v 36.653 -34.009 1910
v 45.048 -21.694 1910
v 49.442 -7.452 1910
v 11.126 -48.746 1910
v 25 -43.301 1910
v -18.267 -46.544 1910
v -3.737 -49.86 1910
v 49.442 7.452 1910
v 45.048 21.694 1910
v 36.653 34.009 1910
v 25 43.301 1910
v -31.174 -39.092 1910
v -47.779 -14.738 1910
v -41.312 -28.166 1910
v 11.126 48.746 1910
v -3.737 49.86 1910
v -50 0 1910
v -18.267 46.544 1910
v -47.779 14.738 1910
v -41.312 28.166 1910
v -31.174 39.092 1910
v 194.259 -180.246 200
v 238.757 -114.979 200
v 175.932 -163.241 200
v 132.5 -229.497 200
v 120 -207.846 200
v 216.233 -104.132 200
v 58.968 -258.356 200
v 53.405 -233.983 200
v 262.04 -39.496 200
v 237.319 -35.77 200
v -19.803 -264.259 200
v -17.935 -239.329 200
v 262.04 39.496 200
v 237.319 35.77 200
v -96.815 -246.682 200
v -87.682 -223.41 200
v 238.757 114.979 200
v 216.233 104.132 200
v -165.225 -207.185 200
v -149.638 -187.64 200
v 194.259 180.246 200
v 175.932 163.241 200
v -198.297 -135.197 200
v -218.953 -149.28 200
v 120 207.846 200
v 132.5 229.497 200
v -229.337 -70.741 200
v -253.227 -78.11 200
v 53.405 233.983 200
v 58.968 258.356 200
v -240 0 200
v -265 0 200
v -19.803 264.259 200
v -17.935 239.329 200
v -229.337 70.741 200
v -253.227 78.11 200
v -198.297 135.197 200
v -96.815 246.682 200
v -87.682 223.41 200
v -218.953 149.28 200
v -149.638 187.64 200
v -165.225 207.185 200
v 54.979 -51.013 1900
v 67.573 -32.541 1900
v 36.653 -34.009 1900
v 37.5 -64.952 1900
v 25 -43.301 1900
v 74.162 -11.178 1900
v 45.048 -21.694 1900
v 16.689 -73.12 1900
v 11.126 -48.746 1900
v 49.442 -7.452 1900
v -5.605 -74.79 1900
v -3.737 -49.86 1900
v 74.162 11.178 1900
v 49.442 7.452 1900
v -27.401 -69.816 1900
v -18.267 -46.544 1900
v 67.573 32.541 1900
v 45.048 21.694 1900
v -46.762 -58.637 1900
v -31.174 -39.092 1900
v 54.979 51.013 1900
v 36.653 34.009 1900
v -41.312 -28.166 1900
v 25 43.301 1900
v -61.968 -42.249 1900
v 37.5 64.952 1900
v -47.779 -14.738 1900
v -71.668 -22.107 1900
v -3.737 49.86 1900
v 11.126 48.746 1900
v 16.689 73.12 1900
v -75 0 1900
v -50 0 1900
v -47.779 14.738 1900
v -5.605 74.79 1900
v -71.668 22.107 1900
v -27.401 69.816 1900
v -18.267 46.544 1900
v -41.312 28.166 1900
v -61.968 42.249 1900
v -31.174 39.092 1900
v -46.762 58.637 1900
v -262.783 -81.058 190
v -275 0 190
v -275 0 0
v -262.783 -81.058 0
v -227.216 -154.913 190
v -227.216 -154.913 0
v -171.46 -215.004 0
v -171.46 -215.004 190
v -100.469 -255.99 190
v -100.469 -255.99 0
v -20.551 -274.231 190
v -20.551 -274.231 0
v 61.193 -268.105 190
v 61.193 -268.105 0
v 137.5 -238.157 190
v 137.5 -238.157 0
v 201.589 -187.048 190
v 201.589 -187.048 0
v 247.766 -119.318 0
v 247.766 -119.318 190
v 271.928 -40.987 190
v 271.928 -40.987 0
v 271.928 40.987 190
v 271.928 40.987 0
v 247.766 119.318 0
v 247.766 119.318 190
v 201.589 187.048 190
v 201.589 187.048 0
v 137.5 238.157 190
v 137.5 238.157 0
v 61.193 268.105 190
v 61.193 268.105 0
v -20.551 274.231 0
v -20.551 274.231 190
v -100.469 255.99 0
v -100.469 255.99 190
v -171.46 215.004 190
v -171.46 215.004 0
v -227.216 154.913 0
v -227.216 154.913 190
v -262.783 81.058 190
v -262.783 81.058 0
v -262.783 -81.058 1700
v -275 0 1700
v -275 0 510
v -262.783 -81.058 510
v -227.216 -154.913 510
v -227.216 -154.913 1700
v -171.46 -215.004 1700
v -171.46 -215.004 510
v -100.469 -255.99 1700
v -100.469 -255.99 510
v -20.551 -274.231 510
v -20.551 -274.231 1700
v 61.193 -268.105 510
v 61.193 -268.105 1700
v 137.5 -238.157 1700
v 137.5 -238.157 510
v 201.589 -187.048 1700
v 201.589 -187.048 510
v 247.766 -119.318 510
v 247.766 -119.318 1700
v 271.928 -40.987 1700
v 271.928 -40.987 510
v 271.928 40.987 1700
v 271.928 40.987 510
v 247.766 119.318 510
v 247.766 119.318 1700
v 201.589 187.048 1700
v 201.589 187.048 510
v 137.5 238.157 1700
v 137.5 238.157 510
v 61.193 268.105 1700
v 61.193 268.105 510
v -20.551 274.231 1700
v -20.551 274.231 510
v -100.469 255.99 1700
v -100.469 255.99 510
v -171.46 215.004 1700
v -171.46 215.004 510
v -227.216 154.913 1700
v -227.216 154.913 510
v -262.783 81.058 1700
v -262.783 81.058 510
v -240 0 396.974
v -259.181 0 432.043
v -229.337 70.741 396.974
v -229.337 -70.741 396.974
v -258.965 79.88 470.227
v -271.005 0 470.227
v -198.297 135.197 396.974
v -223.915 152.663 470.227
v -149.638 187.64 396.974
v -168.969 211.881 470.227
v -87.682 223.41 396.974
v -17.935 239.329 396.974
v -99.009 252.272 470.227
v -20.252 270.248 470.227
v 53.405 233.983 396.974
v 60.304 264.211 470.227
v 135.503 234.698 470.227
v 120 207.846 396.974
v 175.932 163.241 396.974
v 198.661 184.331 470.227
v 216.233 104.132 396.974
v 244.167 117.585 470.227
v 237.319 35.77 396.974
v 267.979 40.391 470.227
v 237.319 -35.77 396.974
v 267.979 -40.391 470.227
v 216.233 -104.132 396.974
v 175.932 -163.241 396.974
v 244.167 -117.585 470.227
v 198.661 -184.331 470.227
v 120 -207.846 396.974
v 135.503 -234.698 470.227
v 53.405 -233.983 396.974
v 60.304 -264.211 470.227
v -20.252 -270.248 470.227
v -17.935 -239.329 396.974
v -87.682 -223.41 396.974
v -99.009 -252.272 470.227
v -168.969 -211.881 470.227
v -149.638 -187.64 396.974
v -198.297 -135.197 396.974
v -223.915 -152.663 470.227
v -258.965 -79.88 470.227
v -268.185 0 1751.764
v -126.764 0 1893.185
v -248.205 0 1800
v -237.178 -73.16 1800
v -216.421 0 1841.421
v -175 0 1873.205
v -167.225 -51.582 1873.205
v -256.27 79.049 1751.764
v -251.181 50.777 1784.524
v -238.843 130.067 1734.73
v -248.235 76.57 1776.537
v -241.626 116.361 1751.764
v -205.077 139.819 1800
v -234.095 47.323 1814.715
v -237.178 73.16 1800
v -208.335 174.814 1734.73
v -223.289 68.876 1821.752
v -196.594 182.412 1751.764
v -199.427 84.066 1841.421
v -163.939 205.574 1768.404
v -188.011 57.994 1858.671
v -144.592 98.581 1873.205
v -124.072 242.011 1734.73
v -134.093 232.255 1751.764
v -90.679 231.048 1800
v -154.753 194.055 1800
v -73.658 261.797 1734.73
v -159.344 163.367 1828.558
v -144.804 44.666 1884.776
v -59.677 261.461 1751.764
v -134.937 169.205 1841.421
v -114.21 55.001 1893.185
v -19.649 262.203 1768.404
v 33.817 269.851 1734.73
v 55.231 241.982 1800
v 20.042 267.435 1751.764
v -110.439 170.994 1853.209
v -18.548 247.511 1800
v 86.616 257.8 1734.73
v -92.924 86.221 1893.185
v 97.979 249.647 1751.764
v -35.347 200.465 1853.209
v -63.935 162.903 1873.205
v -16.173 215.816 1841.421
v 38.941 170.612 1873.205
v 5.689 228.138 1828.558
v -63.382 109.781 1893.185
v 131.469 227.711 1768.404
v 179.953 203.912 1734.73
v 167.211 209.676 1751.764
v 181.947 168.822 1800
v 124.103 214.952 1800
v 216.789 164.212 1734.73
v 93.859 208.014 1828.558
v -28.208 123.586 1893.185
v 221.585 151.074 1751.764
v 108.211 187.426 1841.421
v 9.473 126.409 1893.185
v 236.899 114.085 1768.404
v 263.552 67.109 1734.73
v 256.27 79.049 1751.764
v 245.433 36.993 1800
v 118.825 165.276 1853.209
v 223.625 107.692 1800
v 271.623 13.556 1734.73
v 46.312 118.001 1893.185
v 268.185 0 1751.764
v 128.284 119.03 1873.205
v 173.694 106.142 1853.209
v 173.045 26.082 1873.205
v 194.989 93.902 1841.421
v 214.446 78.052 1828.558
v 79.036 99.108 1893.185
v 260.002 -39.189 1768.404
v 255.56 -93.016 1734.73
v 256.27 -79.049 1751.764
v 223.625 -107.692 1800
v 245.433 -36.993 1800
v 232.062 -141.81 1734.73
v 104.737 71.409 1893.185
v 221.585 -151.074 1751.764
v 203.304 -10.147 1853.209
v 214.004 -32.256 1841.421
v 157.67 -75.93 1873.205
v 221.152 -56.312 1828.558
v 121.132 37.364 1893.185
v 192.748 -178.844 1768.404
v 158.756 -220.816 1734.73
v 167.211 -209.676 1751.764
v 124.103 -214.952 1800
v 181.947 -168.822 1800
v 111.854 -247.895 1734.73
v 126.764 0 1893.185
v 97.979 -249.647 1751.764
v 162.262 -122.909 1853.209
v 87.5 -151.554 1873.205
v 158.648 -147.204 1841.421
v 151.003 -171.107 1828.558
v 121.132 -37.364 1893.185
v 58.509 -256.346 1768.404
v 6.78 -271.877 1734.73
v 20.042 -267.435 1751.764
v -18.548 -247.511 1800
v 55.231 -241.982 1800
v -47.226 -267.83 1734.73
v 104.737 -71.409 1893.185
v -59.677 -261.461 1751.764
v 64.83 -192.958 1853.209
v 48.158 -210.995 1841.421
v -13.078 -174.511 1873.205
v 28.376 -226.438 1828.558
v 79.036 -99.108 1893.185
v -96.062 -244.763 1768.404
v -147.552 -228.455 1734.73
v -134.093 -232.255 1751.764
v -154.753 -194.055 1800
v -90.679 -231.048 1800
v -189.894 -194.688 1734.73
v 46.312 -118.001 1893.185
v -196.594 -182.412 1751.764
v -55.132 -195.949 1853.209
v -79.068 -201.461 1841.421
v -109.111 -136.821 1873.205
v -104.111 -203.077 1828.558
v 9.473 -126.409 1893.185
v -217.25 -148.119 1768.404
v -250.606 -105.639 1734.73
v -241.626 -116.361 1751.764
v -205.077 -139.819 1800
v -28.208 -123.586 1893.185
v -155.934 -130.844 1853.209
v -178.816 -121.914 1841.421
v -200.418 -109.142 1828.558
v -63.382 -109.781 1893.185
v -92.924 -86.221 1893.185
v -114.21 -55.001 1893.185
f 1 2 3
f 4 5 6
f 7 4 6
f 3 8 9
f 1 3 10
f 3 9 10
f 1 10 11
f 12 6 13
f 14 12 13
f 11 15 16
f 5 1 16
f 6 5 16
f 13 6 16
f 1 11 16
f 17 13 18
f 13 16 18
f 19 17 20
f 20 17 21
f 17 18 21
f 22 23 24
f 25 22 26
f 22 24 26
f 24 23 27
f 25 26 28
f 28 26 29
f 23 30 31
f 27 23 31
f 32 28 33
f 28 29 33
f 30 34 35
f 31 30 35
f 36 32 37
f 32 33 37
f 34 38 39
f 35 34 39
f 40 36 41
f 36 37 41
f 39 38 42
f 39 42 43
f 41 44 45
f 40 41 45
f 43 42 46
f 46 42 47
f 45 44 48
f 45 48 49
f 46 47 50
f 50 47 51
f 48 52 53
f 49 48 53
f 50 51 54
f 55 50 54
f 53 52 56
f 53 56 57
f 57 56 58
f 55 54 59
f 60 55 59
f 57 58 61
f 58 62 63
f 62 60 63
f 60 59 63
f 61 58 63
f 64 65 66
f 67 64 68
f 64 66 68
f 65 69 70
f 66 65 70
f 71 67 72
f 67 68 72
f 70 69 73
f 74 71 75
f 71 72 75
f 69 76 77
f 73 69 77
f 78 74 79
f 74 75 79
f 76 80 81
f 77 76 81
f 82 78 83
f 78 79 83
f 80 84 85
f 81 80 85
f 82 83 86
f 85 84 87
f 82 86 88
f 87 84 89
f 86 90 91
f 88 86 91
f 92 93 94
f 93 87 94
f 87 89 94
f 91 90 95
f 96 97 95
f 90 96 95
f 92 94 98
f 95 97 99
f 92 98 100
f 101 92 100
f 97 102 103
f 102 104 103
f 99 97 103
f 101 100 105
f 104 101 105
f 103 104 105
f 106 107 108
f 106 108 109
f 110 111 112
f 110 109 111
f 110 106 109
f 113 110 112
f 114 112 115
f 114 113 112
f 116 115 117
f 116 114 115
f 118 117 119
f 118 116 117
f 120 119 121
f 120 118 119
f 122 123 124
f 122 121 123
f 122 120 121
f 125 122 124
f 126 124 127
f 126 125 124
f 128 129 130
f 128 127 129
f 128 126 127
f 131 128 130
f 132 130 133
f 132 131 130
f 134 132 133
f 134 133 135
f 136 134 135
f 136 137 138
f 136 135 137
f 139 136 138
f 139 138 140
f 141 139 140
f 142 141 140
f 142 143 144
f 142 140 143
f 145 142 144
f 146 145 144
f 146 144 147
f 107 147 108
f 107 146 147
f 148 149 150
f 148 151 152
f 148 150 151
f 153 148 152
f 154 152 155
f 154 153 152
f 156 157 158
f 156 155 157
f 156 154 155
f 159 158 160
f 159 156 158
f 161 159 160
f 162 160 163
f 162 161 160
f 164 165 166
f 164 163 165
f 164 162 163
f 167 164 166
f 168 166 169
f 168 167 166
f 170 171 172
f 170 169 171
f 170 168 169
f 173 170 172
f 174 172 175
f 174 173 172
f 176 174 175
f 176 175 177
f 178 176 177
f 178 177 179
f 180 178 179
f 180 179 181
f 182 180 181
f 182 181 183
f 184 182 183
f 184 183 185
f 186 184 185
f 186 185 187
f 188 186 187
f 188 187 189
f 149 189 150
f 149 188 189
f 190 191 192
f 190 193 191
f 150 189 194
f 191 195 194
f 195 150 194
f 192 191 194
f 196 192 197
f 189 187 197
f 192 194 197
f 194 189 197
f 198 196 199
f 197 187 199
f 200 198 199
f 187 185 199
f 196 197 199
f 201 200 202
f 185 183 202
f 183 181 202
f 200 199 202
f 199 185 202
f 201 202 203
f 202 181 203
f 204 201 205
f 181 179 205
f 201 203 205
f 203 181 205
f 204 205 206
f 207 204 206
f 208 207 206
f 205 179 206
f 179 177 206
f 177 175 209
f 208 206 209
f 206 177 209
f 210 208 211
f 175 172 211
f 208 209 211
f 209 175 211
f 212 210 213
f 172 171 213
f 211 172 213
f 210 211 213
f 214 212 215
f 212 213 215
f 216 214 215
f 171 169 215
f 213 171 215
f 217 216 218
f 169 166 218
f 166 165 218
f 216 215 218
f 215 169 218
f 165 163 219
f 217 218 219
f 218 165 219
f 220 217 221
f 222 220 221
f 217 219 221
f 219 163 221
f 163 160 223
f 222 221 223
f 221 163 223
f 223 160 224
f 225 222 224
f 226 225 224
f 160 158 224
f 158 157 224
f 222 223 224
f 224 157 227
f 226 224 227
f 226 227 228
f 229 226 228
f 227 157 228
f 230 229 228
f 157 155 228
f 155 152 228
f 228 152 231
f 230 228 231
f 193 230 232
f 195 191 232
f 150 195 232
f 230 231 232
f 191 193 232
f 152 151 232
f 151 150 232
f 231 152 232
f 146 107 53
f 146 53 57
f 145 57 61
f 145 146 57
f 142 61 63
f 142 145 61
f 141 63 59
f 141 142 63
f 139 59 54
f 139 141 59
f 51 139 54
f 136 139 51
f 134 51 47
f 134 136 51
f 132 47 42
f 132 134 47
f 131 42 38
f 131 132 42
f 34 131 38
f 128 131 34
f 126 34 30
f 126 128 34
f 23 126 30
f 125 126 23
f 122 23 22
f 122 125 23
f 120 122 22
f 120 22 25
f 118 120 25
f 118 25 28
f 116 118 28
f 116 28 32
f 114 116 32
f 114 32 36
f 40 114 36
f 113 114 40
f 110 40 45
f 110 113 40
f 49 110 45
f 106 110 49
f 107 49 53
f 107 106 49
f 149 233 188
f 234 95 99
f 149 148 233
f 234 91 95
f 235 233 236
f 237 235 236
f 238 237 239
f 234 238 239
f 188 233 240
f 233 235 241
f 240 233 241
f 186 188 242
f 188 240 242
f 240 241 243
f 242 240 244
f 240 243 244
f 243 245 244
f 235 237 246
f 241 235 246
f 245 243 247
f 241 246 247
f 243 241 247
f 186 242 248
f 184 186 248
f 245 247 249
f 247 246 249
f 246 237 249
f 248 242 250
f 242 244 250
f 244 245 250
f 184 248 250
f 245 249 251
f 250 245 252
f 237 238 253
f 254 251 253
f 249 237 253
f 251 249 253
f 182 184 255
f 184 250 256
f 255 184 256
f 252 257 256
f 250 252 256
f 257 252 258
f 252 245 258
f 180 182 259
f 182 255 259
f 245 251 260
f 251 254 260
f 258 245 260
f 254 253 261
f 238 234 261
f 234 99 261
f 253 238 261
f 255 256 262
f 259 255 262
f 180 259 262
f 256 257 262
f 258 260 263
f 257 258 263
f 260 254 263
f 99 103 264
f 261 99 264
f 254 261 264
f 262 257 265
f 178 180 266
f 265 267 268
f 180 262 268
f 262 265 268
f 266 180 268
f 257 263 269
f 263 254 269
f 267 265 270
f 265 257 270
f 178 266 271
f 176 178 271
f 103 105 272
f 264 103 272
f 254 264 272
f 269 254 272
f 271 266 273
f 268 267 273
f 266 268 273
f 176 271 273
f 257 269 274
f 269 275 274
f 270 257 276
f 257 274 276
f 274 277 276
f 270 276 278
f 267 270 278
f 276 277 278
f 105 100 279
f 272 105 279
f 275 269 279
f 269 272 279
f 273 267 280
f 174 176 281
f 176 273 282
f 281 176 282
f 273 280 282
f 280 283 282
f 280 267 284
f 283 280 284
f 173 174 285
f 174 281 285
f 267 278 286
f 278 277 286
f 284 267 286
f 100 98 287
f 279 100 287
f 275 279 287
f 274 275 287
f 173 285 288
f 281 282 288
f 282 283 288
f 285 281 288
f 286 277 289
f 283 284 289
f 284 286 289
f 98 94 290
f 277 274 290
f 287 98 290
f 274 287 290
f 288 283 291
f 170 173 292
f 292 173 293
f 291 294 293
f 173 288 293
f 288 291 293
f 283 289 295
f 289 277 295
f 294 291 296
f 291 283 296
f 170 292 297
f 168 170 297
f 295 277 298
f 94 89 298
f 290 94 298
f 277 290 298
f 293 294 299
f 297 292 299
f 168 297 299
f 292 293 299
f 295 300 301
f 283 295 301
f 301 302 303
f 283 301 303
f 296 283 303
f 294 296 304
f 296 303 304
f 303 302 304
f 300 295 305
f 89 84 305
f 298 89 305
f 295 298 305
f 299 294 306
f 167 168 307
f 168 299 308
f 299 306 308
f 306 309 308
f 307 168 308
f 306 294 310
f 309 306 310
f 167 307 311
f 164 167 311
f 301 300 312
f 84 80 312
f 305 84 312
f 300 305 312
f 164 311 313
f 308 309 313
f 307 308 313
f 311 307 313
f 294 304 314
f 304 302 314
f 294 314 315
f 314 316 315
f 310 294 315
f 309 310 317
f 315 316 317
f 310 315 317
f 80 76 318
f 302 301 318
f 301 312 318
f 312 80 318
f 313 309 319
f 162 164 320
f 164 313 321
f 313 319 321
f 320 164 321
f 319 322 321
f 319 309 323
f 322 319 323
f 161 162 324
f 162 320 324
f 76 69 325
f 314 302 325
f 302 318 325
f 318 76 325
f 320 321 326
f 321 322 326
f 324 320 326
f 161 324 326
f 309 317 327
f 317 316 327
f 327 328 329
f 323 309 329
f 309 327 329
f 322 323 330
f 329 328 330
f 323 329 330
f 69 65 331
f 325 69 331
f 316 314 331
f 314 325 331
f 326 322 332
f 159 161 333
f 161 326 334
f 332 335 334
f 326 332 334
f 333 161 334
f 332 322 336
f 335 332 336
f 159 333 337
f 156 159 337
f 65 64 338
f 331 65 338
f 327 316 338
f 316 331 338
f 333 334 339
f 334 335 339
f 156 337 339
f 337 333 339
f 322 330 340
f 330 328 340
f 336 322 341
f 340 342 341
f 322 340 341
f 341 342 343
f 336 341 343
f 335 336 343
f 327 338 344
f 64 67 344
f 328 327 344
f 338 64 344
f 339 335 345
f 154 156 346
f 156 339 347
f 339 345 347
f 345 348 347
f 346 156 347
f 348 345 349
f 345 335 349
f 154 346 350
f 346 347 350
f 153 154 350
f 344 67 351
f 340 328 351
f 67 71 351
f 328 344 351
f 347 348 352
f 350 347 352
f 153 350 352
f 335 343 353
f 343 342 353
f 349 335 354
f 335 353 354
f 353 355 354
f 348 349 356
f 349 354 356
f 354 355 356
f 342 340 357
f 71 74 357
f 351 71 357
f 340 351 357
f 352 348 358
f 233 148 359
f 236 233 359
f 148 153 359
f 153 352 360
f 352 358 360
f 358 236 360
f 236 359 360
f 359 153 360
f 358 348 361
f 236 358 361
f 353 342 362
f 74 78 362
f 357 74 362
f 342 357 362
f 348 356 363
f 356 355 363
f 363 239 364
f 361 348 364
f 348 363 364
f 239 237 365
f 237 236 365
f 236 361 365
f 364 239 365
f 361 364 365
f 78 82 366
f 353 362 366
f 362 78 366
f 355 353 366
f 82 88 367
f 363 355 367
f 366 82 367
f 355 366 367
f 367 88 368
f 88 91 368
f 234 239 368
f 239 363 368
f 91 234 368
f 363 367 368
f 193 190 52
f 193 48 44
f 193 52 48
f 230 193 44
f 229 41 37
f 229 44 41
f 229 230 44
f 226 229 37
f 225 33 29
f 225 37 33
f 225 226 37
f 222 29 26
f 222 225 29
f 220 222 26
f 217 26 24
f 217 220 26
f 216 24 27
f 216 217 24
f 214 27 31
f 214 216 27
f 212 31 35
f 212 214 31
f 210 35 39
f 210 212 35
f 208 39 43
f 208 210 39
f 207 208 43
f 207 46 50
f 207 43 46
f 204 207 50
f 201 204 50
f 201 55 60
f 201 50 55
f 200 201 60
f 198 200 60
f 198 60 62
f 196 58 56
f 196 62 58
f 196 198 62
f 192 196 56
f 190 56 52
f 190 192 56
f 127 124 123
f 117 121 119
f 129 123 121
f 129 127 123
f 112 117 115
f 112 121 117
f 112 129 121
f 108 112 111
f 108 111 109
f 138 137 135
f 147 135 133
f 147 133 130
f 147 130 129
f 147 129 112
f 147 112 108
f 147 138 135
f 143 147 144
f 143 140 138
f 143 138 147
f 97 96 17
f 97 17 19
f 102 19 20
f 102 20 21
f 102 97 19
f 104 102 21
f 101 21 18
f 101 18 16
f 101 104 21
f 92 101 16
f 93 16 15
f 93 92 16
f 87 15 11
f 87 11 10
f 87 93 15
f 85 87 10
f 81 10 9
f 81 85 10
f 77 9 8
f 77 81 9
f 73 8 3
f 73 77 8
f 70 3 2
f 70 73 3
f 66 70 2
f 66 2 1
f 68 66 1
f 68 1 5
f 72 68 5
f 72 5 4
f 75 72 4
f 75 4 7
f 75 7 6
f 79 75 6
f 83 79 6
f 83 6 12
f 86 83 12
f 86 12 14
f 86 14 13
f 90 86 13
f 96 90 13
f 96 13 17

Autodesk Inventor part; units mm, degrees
ref_plane "YZ Plane" through (0, 0, 0) normal (1, 0, 0) x (0, 1, 0)
ref_plane "XZ Plane" through (0, 0, 0) normal (0, 1, 0) x (-1, 0, 0)
ref_plane "XY Plane" through (0, 0, 0) normal (0, 0, 1) x (1, 0, 0)
sketch "Sketch2" plane through (0, 0, 0) normal (0, 1, 0) x (-1, 0, 0)
  line L0 (0, 2130.997) -> (0, 0)
  line L1 (275, 1900) -> (75, 1900) construction
  line L2 (0, 1900) -> (0, 0)
  line L3 (0, 0) -> (275, 0)
  line L4 (275, 0) -> (275, 200)
  line L5 (275, 310) -> (75, 310) construction
  arc A0 (75, 310) -> (275, 510) centre (75, 510) ccw
  arc A1 (275, 1700) -> (75, 1900) centre (75, 1700) ccw
  line L6 (75, 1900) -> (0, 1900)
  line L7 (275, 1700) -> (275, 1900) construction
  line L8 (75, 310) -> (0, 310)
  line L9 (275, 310) -> (275, 510) construction
  line L10 (275, 510) -> (275, 1700)
  line L11 (275, 200) -> (240, 200)
  line L12 (240, 200) -> (240, 396.9735)
  line L13 (275, 200) -> (275, 310) construction
  line L14 (0, 1910) -> (50, 1910)
  line L15 (50, 1910) -> (50, 1900)
  point P0 (0, 1900)
  dimension "d3" = 550
  dimension "d7" = 200
  dimension "d8" = 200
  dimension "d9" = 35
  dimension "d10" = 200
  dimension "d12" = 50
  dimension "d13" = 10
  dimension "d14" = 1910
  dimension "d15" = 1600
revolve "Revolution1" add sketch "Sketch2" angle 360 about axis through (0, 0, 2130.997) along (0, 0, -1)
chamfer "Chamfer1" distance 10 angle 45 1 edges at (275, 0, 200)
equation "\"d3\" = D"
equation "\"d8\" = d7"
equation "\"d14\" = H1"
equation "\"d15\" = H2"
equation "\"H1\" = 1910"
equation "\"H2\" = 1600"
equation "\"D\" = 550"
properties part number "HY-H H2162–4T"
